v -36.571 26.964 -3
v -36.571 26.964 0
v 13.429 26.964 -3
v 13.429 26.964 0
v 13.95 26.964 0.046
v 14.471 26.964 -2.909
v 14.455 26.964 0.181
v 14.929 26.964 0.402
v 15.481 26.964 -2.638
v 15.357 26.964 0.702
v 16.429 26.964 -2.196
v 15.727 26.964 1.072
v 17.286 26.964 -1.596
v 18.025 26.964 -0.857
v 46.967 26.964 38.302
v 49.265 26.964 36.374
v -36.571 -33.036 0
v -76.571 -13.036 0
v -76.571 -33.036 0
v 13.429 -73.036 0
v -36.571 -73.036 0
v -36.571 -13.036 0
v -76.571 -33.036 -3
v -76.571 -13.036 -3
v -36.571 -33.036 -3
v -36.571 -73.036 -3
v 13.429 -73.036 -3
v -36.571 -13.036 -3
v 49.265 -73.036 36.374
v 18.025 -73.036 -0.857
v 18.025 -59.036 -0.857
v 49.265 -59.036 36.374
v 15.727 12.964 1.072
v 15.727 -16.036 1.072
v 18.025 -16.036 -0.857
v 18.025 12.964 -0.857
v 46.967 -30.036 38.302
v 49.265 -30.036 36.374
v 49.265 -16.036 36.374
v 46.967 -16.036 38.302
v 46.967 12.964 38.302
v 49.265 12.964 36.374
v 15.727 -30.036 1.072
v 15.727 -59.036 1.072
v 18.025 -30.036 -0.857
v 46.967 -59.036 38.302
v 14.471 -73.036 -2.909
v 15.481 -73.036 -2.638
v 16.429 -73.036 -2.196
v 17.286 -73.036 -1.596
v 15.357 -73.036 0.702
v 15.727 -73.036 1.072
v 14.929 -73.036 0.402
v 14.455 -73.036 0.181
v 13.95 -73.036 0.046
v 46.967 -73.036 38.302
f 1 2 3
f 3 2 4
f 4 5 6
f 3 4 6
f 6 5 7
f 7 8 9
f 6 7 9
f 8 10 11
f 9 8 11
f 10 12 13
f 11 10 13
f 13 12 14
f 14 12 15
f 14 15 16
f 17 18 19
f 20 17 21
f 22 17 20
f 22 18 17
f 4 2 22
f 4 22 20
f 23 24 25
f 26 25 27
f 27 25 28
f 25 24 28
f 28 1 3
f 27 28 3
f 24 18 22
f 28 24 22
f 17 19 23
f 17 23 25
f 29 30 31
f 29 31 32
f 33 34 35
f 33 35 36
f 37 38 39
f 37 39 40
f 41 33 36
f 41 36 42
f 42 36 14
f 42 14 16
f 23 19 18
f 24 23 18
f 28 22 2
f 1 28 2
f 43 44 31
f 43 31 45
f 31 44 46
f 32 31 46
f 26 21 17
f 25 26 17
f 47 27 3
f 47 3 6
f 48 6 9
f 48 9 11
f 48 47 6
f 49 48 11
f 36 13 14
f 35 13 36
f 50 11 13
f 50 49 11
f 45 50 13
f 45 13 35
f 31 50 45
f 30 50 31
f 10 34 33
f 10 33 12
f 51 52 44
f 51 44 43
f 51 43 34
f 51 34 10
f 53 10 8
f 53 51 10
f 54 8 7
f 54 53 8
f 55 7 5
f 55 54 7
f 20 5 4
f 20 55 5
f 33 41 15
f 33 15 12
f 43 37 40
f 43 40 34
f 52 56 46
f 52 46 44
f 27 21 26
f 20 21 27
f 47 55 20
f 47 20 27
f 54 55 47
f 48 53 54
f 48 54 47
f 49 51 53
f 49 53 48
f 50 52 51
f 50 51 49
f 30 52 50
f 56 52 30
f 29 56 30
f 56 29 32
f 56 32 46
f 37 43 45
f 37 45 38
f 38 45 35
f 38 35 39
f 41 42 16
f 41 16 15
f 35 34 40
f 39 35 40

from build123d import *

# Parameters (mm, degrees)
SKETCH1_W          = 50
SKETCH1_H          = 100
BASE_FLANGE1_DEPTH = 3
EDGE_FLANGE2_DEPTH = 100
SKETCH12_W         = 48.601077025
SKETCH12_H         = 29
CUT_EXTRUDE1_DEPTH = 29
SKETCH13_W         = 48.601077025
SKETCH13_H         = 29
CUT_EXTRUDE2_DEPTH = 29
SKETCH14_W         = 80
SKETCH14_H         = 20
TAB1_DEPTH         = 3


# Sheet-metal steps are written as plain solids
with BuildPart() as part:
    # Sketch1 → Base-Flange1 (new body)
    with BuildSketch(Plane.XY):
        with Locations((-11.571125265, -23.036093418)):
            Rectangle(SKETCH1_W, SKETCH1_H)
    extrude(amount=-BASE_FLANGE1_DEPTH)

    # Edge-Flange2 section (across the edge) → Edge-Flange2 (add)
    with BuildSketch(Plane(origin=(14.827797709, -73.036093418, 0), x_dir=(-0.7660444431189746, 0, 0.6427876096865435), z_dir=(0, 1, 0))):
        with BuildLine():
            Line((-3, 1.398922974), (-3, 50))
            Line((-3, 50), (0, 50))
            Line((0, 50), (0, 1.398922974))
            ThreePointArc((0, 1.398922974), (0.281076639, 0.131068189), (1.071637171, -0.899210355))
            Line((1.071637171, -0.899210355), (-0.856725658, -3.197343684))
            ThreePointArc((-0.856725658, -3.197343684), (-2.437846722, -1.136786596), (-3, 1.398922974))
        make_face()
    extrude(amount=EDGE_FLANGE2_DEPTH)

    # Sketch12 → Cut-Extrude1 (cut)
    with BuildSketch(Plane(origin=(8.70130888, 0, -7.301265072), x_dir=(0.6427876096865439, 0, 0.7660444431189742), z_dir=(-0.7660444431189742, 0, 0.6427876096865439))):
        with Locations((35.230586133, -1.536093418)):
            Rectangle(SKETCH12_W, SKETCH12_H)
    extrude(amount=-CUT_EXTRUDE1_DEPTH, mode=Mode.SUBTRACT)

    # Sketch13 → Cut-Extrude2 (cut)
    with BuildSketch(Plane(origin=(8.70130888, 0, -7.301265072), x_dir=(0.6427876096865439, 0, 0.7660444431189742), z_dir=(-0.7660444431189742, 0, 0.6427876096865439))):
        with Locations((35.230586133, -44.536093418)):
            Rectangle(SKETCH13_W, SKETCH13_H)
    extrude(amount=-CUT_EXTRUDE2_DEPTH, mode=Mode.SUBTRACT)

    # Sketch14 → Tab1 (add)
    with BuildSketch(Plane.XY):
        with Locations((-36.571125265, -23.036093418)):
            Rectangle(SKETCH14_W, SKETCH14_H)
    extrude(amount=-TAB1_DEPTH)


solid = part.part
